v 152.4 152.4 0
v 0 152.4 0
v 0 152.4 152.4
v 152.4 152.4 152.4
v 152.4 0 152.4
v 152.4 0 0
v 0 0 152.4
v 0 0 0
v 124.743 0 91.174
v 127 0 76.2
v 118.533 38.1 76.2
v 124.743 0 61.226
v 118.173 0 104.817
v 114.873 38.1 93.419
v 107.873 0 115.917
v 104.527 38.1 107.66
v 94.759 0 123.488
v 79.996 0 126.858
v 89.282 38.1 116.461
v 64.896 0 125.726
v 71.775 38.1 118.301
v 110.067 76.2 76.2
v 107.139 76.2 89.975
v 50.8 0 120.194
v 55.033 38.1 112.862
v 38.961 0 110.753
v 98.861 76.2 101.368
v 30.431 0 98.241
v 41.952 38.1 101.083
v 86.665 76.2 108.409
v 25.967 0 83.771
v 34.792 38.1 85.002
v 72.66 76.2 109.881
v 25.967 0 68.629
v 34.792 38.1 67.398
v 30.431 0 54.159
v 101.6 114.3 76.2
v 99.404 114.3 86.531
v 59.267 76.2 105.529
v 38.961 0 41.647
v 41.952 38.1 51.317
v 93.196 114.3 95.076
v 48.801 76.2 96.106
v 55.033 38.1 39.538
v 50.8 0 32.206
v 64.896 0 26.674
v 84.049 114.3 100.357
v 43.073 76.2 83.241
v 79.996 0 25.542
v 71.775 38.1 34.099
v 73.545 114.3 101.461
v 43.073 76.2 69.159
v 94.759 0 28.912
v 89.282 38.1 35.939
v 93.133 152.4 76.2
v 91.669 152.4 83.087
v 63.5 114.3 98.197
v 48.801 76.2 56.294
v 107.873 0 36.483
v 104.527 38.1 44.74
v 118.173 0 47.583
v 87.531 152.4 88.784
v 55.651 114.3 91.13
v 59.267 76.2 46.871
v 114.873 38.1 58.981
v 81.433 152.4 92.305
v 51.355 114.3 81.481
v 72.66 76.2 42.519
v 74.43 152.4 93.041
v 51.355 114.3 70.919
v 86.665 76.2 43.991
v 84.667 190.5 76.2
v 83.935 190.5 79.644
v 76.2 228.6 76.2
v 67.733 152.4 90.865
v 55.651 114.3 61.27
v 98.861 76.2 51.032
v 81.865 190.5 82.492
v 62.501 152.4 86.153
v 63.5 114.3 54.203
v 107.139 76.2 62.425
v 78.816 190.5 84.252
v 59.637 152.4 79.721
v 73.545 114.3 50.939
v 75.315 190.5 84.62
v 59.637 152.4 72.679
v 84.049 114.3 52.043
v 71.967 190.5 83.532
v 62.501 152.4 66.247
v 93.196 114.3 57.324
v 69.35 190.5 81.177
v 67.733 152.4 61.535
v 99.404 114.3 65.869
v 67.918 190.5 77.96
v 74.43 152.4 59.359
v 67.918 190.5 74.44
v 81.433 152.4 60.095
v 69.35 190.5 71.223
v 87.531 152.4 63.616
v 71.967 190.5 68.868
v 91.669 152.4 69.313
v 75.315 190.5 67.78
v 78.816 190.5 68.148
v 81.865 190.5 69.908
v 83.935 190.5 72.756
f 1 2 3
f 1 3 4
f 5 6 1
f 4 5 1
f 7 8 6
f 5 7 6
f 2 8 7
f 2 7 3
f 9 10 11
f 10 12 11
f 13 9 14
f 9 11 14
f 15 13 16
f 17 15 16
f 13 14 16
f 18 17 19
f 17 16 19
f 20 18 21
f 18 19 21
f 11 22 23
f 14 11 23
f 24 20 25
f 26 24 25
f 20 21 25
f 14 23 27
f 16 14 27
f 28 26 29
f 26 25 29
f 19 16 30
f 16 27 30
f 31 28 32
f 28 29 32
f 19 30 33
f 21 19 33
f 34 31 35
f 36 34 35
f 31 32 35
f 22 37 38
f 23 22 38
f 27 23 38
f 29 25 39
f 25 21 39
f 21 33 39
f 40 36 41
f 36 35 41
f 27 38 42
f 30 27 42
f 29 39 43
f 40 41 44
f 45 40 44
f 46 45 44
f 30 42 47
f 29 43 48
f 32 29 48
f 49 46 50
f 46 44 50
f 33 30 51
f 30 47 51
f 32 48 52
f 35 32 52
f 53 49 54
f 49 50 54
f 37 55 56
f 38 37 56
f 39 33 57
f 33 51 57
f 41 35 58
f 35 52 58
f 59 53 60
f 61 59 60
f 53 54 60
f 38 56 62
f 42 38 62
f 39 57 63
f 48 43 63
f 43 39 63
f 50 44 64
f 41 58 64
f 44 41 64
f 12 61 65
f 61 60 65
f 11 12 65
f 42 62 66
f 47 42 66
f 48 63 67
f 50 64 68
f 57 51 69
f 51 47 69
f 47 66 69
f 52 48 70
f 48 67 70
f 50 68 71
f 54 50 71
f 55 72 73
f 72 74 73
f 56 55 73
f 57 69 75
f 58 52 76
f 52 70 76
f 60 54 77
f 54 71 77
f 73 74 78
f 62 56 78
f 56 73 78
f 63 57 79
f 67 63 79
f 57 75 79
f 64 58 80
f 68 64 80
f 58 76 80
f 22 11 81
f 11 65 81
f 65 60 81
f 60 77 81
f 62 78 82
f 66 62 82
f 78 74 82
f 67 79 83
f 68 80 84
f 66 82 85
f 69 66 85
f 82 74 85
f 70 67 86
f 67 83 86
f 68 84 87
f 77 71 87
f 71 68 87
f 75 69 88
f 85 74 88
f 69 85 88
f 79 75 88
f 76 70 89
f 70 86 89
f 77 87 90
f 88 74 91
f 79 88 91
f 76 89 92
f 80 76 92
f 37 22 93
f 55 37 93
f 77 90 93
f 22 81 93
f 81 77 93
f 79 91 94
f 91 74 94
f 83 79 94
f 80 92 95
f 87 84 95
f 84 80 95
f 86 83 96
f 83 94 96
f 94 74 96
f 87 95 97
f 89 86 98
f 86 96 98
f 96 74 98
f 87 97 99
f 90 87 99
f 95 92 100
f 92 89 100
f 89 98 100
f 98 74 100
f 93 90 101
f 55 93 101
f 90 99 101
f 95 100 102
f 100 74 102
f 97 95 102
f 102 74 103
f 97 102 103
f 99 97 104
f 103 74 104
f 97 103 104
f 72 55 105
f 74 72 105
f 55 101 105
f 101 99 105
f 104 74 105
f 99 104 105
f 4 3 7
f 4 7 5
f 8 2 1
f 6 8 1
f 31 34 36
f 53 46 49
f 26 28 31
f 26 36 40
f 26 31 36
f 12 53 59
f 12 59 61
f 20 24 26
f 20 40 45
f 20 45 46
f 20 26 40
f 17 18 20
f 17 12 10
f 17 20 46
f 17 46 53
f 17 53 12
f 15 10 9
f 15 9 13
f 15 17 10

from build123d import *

# Parameters (mm, degrees)
SKETCH1_W  = 152.4
SKETCH1_H  = 152.4
CUBE_DEPTH = 152.4
SKETCH2_R  = 50.8


with BuildPart() as part:
    # Sketch1 → Cube (new body)
    with BuildSketch(Plane.XY):
        with Locations((76.2, 76.2)):
            Rectangle(SKETCH1_W, SKETCH1_H)
    extrude(amount=CUBE_DEPTH)


with BuildPart() as body_2:
    # Sketch2 → Cone section 0
    with BuildSketch(Plane.XZ, mode=Mode.PRIVATE) as cone_s0:
        with Locations((76.2, 76.2)):
            Circle(SKETCH2_R)
    loft([cone_s0.sketch, Vertex(76.2, 228.6, 76.2)])


solid = Compound([part.part, body_2.part])
